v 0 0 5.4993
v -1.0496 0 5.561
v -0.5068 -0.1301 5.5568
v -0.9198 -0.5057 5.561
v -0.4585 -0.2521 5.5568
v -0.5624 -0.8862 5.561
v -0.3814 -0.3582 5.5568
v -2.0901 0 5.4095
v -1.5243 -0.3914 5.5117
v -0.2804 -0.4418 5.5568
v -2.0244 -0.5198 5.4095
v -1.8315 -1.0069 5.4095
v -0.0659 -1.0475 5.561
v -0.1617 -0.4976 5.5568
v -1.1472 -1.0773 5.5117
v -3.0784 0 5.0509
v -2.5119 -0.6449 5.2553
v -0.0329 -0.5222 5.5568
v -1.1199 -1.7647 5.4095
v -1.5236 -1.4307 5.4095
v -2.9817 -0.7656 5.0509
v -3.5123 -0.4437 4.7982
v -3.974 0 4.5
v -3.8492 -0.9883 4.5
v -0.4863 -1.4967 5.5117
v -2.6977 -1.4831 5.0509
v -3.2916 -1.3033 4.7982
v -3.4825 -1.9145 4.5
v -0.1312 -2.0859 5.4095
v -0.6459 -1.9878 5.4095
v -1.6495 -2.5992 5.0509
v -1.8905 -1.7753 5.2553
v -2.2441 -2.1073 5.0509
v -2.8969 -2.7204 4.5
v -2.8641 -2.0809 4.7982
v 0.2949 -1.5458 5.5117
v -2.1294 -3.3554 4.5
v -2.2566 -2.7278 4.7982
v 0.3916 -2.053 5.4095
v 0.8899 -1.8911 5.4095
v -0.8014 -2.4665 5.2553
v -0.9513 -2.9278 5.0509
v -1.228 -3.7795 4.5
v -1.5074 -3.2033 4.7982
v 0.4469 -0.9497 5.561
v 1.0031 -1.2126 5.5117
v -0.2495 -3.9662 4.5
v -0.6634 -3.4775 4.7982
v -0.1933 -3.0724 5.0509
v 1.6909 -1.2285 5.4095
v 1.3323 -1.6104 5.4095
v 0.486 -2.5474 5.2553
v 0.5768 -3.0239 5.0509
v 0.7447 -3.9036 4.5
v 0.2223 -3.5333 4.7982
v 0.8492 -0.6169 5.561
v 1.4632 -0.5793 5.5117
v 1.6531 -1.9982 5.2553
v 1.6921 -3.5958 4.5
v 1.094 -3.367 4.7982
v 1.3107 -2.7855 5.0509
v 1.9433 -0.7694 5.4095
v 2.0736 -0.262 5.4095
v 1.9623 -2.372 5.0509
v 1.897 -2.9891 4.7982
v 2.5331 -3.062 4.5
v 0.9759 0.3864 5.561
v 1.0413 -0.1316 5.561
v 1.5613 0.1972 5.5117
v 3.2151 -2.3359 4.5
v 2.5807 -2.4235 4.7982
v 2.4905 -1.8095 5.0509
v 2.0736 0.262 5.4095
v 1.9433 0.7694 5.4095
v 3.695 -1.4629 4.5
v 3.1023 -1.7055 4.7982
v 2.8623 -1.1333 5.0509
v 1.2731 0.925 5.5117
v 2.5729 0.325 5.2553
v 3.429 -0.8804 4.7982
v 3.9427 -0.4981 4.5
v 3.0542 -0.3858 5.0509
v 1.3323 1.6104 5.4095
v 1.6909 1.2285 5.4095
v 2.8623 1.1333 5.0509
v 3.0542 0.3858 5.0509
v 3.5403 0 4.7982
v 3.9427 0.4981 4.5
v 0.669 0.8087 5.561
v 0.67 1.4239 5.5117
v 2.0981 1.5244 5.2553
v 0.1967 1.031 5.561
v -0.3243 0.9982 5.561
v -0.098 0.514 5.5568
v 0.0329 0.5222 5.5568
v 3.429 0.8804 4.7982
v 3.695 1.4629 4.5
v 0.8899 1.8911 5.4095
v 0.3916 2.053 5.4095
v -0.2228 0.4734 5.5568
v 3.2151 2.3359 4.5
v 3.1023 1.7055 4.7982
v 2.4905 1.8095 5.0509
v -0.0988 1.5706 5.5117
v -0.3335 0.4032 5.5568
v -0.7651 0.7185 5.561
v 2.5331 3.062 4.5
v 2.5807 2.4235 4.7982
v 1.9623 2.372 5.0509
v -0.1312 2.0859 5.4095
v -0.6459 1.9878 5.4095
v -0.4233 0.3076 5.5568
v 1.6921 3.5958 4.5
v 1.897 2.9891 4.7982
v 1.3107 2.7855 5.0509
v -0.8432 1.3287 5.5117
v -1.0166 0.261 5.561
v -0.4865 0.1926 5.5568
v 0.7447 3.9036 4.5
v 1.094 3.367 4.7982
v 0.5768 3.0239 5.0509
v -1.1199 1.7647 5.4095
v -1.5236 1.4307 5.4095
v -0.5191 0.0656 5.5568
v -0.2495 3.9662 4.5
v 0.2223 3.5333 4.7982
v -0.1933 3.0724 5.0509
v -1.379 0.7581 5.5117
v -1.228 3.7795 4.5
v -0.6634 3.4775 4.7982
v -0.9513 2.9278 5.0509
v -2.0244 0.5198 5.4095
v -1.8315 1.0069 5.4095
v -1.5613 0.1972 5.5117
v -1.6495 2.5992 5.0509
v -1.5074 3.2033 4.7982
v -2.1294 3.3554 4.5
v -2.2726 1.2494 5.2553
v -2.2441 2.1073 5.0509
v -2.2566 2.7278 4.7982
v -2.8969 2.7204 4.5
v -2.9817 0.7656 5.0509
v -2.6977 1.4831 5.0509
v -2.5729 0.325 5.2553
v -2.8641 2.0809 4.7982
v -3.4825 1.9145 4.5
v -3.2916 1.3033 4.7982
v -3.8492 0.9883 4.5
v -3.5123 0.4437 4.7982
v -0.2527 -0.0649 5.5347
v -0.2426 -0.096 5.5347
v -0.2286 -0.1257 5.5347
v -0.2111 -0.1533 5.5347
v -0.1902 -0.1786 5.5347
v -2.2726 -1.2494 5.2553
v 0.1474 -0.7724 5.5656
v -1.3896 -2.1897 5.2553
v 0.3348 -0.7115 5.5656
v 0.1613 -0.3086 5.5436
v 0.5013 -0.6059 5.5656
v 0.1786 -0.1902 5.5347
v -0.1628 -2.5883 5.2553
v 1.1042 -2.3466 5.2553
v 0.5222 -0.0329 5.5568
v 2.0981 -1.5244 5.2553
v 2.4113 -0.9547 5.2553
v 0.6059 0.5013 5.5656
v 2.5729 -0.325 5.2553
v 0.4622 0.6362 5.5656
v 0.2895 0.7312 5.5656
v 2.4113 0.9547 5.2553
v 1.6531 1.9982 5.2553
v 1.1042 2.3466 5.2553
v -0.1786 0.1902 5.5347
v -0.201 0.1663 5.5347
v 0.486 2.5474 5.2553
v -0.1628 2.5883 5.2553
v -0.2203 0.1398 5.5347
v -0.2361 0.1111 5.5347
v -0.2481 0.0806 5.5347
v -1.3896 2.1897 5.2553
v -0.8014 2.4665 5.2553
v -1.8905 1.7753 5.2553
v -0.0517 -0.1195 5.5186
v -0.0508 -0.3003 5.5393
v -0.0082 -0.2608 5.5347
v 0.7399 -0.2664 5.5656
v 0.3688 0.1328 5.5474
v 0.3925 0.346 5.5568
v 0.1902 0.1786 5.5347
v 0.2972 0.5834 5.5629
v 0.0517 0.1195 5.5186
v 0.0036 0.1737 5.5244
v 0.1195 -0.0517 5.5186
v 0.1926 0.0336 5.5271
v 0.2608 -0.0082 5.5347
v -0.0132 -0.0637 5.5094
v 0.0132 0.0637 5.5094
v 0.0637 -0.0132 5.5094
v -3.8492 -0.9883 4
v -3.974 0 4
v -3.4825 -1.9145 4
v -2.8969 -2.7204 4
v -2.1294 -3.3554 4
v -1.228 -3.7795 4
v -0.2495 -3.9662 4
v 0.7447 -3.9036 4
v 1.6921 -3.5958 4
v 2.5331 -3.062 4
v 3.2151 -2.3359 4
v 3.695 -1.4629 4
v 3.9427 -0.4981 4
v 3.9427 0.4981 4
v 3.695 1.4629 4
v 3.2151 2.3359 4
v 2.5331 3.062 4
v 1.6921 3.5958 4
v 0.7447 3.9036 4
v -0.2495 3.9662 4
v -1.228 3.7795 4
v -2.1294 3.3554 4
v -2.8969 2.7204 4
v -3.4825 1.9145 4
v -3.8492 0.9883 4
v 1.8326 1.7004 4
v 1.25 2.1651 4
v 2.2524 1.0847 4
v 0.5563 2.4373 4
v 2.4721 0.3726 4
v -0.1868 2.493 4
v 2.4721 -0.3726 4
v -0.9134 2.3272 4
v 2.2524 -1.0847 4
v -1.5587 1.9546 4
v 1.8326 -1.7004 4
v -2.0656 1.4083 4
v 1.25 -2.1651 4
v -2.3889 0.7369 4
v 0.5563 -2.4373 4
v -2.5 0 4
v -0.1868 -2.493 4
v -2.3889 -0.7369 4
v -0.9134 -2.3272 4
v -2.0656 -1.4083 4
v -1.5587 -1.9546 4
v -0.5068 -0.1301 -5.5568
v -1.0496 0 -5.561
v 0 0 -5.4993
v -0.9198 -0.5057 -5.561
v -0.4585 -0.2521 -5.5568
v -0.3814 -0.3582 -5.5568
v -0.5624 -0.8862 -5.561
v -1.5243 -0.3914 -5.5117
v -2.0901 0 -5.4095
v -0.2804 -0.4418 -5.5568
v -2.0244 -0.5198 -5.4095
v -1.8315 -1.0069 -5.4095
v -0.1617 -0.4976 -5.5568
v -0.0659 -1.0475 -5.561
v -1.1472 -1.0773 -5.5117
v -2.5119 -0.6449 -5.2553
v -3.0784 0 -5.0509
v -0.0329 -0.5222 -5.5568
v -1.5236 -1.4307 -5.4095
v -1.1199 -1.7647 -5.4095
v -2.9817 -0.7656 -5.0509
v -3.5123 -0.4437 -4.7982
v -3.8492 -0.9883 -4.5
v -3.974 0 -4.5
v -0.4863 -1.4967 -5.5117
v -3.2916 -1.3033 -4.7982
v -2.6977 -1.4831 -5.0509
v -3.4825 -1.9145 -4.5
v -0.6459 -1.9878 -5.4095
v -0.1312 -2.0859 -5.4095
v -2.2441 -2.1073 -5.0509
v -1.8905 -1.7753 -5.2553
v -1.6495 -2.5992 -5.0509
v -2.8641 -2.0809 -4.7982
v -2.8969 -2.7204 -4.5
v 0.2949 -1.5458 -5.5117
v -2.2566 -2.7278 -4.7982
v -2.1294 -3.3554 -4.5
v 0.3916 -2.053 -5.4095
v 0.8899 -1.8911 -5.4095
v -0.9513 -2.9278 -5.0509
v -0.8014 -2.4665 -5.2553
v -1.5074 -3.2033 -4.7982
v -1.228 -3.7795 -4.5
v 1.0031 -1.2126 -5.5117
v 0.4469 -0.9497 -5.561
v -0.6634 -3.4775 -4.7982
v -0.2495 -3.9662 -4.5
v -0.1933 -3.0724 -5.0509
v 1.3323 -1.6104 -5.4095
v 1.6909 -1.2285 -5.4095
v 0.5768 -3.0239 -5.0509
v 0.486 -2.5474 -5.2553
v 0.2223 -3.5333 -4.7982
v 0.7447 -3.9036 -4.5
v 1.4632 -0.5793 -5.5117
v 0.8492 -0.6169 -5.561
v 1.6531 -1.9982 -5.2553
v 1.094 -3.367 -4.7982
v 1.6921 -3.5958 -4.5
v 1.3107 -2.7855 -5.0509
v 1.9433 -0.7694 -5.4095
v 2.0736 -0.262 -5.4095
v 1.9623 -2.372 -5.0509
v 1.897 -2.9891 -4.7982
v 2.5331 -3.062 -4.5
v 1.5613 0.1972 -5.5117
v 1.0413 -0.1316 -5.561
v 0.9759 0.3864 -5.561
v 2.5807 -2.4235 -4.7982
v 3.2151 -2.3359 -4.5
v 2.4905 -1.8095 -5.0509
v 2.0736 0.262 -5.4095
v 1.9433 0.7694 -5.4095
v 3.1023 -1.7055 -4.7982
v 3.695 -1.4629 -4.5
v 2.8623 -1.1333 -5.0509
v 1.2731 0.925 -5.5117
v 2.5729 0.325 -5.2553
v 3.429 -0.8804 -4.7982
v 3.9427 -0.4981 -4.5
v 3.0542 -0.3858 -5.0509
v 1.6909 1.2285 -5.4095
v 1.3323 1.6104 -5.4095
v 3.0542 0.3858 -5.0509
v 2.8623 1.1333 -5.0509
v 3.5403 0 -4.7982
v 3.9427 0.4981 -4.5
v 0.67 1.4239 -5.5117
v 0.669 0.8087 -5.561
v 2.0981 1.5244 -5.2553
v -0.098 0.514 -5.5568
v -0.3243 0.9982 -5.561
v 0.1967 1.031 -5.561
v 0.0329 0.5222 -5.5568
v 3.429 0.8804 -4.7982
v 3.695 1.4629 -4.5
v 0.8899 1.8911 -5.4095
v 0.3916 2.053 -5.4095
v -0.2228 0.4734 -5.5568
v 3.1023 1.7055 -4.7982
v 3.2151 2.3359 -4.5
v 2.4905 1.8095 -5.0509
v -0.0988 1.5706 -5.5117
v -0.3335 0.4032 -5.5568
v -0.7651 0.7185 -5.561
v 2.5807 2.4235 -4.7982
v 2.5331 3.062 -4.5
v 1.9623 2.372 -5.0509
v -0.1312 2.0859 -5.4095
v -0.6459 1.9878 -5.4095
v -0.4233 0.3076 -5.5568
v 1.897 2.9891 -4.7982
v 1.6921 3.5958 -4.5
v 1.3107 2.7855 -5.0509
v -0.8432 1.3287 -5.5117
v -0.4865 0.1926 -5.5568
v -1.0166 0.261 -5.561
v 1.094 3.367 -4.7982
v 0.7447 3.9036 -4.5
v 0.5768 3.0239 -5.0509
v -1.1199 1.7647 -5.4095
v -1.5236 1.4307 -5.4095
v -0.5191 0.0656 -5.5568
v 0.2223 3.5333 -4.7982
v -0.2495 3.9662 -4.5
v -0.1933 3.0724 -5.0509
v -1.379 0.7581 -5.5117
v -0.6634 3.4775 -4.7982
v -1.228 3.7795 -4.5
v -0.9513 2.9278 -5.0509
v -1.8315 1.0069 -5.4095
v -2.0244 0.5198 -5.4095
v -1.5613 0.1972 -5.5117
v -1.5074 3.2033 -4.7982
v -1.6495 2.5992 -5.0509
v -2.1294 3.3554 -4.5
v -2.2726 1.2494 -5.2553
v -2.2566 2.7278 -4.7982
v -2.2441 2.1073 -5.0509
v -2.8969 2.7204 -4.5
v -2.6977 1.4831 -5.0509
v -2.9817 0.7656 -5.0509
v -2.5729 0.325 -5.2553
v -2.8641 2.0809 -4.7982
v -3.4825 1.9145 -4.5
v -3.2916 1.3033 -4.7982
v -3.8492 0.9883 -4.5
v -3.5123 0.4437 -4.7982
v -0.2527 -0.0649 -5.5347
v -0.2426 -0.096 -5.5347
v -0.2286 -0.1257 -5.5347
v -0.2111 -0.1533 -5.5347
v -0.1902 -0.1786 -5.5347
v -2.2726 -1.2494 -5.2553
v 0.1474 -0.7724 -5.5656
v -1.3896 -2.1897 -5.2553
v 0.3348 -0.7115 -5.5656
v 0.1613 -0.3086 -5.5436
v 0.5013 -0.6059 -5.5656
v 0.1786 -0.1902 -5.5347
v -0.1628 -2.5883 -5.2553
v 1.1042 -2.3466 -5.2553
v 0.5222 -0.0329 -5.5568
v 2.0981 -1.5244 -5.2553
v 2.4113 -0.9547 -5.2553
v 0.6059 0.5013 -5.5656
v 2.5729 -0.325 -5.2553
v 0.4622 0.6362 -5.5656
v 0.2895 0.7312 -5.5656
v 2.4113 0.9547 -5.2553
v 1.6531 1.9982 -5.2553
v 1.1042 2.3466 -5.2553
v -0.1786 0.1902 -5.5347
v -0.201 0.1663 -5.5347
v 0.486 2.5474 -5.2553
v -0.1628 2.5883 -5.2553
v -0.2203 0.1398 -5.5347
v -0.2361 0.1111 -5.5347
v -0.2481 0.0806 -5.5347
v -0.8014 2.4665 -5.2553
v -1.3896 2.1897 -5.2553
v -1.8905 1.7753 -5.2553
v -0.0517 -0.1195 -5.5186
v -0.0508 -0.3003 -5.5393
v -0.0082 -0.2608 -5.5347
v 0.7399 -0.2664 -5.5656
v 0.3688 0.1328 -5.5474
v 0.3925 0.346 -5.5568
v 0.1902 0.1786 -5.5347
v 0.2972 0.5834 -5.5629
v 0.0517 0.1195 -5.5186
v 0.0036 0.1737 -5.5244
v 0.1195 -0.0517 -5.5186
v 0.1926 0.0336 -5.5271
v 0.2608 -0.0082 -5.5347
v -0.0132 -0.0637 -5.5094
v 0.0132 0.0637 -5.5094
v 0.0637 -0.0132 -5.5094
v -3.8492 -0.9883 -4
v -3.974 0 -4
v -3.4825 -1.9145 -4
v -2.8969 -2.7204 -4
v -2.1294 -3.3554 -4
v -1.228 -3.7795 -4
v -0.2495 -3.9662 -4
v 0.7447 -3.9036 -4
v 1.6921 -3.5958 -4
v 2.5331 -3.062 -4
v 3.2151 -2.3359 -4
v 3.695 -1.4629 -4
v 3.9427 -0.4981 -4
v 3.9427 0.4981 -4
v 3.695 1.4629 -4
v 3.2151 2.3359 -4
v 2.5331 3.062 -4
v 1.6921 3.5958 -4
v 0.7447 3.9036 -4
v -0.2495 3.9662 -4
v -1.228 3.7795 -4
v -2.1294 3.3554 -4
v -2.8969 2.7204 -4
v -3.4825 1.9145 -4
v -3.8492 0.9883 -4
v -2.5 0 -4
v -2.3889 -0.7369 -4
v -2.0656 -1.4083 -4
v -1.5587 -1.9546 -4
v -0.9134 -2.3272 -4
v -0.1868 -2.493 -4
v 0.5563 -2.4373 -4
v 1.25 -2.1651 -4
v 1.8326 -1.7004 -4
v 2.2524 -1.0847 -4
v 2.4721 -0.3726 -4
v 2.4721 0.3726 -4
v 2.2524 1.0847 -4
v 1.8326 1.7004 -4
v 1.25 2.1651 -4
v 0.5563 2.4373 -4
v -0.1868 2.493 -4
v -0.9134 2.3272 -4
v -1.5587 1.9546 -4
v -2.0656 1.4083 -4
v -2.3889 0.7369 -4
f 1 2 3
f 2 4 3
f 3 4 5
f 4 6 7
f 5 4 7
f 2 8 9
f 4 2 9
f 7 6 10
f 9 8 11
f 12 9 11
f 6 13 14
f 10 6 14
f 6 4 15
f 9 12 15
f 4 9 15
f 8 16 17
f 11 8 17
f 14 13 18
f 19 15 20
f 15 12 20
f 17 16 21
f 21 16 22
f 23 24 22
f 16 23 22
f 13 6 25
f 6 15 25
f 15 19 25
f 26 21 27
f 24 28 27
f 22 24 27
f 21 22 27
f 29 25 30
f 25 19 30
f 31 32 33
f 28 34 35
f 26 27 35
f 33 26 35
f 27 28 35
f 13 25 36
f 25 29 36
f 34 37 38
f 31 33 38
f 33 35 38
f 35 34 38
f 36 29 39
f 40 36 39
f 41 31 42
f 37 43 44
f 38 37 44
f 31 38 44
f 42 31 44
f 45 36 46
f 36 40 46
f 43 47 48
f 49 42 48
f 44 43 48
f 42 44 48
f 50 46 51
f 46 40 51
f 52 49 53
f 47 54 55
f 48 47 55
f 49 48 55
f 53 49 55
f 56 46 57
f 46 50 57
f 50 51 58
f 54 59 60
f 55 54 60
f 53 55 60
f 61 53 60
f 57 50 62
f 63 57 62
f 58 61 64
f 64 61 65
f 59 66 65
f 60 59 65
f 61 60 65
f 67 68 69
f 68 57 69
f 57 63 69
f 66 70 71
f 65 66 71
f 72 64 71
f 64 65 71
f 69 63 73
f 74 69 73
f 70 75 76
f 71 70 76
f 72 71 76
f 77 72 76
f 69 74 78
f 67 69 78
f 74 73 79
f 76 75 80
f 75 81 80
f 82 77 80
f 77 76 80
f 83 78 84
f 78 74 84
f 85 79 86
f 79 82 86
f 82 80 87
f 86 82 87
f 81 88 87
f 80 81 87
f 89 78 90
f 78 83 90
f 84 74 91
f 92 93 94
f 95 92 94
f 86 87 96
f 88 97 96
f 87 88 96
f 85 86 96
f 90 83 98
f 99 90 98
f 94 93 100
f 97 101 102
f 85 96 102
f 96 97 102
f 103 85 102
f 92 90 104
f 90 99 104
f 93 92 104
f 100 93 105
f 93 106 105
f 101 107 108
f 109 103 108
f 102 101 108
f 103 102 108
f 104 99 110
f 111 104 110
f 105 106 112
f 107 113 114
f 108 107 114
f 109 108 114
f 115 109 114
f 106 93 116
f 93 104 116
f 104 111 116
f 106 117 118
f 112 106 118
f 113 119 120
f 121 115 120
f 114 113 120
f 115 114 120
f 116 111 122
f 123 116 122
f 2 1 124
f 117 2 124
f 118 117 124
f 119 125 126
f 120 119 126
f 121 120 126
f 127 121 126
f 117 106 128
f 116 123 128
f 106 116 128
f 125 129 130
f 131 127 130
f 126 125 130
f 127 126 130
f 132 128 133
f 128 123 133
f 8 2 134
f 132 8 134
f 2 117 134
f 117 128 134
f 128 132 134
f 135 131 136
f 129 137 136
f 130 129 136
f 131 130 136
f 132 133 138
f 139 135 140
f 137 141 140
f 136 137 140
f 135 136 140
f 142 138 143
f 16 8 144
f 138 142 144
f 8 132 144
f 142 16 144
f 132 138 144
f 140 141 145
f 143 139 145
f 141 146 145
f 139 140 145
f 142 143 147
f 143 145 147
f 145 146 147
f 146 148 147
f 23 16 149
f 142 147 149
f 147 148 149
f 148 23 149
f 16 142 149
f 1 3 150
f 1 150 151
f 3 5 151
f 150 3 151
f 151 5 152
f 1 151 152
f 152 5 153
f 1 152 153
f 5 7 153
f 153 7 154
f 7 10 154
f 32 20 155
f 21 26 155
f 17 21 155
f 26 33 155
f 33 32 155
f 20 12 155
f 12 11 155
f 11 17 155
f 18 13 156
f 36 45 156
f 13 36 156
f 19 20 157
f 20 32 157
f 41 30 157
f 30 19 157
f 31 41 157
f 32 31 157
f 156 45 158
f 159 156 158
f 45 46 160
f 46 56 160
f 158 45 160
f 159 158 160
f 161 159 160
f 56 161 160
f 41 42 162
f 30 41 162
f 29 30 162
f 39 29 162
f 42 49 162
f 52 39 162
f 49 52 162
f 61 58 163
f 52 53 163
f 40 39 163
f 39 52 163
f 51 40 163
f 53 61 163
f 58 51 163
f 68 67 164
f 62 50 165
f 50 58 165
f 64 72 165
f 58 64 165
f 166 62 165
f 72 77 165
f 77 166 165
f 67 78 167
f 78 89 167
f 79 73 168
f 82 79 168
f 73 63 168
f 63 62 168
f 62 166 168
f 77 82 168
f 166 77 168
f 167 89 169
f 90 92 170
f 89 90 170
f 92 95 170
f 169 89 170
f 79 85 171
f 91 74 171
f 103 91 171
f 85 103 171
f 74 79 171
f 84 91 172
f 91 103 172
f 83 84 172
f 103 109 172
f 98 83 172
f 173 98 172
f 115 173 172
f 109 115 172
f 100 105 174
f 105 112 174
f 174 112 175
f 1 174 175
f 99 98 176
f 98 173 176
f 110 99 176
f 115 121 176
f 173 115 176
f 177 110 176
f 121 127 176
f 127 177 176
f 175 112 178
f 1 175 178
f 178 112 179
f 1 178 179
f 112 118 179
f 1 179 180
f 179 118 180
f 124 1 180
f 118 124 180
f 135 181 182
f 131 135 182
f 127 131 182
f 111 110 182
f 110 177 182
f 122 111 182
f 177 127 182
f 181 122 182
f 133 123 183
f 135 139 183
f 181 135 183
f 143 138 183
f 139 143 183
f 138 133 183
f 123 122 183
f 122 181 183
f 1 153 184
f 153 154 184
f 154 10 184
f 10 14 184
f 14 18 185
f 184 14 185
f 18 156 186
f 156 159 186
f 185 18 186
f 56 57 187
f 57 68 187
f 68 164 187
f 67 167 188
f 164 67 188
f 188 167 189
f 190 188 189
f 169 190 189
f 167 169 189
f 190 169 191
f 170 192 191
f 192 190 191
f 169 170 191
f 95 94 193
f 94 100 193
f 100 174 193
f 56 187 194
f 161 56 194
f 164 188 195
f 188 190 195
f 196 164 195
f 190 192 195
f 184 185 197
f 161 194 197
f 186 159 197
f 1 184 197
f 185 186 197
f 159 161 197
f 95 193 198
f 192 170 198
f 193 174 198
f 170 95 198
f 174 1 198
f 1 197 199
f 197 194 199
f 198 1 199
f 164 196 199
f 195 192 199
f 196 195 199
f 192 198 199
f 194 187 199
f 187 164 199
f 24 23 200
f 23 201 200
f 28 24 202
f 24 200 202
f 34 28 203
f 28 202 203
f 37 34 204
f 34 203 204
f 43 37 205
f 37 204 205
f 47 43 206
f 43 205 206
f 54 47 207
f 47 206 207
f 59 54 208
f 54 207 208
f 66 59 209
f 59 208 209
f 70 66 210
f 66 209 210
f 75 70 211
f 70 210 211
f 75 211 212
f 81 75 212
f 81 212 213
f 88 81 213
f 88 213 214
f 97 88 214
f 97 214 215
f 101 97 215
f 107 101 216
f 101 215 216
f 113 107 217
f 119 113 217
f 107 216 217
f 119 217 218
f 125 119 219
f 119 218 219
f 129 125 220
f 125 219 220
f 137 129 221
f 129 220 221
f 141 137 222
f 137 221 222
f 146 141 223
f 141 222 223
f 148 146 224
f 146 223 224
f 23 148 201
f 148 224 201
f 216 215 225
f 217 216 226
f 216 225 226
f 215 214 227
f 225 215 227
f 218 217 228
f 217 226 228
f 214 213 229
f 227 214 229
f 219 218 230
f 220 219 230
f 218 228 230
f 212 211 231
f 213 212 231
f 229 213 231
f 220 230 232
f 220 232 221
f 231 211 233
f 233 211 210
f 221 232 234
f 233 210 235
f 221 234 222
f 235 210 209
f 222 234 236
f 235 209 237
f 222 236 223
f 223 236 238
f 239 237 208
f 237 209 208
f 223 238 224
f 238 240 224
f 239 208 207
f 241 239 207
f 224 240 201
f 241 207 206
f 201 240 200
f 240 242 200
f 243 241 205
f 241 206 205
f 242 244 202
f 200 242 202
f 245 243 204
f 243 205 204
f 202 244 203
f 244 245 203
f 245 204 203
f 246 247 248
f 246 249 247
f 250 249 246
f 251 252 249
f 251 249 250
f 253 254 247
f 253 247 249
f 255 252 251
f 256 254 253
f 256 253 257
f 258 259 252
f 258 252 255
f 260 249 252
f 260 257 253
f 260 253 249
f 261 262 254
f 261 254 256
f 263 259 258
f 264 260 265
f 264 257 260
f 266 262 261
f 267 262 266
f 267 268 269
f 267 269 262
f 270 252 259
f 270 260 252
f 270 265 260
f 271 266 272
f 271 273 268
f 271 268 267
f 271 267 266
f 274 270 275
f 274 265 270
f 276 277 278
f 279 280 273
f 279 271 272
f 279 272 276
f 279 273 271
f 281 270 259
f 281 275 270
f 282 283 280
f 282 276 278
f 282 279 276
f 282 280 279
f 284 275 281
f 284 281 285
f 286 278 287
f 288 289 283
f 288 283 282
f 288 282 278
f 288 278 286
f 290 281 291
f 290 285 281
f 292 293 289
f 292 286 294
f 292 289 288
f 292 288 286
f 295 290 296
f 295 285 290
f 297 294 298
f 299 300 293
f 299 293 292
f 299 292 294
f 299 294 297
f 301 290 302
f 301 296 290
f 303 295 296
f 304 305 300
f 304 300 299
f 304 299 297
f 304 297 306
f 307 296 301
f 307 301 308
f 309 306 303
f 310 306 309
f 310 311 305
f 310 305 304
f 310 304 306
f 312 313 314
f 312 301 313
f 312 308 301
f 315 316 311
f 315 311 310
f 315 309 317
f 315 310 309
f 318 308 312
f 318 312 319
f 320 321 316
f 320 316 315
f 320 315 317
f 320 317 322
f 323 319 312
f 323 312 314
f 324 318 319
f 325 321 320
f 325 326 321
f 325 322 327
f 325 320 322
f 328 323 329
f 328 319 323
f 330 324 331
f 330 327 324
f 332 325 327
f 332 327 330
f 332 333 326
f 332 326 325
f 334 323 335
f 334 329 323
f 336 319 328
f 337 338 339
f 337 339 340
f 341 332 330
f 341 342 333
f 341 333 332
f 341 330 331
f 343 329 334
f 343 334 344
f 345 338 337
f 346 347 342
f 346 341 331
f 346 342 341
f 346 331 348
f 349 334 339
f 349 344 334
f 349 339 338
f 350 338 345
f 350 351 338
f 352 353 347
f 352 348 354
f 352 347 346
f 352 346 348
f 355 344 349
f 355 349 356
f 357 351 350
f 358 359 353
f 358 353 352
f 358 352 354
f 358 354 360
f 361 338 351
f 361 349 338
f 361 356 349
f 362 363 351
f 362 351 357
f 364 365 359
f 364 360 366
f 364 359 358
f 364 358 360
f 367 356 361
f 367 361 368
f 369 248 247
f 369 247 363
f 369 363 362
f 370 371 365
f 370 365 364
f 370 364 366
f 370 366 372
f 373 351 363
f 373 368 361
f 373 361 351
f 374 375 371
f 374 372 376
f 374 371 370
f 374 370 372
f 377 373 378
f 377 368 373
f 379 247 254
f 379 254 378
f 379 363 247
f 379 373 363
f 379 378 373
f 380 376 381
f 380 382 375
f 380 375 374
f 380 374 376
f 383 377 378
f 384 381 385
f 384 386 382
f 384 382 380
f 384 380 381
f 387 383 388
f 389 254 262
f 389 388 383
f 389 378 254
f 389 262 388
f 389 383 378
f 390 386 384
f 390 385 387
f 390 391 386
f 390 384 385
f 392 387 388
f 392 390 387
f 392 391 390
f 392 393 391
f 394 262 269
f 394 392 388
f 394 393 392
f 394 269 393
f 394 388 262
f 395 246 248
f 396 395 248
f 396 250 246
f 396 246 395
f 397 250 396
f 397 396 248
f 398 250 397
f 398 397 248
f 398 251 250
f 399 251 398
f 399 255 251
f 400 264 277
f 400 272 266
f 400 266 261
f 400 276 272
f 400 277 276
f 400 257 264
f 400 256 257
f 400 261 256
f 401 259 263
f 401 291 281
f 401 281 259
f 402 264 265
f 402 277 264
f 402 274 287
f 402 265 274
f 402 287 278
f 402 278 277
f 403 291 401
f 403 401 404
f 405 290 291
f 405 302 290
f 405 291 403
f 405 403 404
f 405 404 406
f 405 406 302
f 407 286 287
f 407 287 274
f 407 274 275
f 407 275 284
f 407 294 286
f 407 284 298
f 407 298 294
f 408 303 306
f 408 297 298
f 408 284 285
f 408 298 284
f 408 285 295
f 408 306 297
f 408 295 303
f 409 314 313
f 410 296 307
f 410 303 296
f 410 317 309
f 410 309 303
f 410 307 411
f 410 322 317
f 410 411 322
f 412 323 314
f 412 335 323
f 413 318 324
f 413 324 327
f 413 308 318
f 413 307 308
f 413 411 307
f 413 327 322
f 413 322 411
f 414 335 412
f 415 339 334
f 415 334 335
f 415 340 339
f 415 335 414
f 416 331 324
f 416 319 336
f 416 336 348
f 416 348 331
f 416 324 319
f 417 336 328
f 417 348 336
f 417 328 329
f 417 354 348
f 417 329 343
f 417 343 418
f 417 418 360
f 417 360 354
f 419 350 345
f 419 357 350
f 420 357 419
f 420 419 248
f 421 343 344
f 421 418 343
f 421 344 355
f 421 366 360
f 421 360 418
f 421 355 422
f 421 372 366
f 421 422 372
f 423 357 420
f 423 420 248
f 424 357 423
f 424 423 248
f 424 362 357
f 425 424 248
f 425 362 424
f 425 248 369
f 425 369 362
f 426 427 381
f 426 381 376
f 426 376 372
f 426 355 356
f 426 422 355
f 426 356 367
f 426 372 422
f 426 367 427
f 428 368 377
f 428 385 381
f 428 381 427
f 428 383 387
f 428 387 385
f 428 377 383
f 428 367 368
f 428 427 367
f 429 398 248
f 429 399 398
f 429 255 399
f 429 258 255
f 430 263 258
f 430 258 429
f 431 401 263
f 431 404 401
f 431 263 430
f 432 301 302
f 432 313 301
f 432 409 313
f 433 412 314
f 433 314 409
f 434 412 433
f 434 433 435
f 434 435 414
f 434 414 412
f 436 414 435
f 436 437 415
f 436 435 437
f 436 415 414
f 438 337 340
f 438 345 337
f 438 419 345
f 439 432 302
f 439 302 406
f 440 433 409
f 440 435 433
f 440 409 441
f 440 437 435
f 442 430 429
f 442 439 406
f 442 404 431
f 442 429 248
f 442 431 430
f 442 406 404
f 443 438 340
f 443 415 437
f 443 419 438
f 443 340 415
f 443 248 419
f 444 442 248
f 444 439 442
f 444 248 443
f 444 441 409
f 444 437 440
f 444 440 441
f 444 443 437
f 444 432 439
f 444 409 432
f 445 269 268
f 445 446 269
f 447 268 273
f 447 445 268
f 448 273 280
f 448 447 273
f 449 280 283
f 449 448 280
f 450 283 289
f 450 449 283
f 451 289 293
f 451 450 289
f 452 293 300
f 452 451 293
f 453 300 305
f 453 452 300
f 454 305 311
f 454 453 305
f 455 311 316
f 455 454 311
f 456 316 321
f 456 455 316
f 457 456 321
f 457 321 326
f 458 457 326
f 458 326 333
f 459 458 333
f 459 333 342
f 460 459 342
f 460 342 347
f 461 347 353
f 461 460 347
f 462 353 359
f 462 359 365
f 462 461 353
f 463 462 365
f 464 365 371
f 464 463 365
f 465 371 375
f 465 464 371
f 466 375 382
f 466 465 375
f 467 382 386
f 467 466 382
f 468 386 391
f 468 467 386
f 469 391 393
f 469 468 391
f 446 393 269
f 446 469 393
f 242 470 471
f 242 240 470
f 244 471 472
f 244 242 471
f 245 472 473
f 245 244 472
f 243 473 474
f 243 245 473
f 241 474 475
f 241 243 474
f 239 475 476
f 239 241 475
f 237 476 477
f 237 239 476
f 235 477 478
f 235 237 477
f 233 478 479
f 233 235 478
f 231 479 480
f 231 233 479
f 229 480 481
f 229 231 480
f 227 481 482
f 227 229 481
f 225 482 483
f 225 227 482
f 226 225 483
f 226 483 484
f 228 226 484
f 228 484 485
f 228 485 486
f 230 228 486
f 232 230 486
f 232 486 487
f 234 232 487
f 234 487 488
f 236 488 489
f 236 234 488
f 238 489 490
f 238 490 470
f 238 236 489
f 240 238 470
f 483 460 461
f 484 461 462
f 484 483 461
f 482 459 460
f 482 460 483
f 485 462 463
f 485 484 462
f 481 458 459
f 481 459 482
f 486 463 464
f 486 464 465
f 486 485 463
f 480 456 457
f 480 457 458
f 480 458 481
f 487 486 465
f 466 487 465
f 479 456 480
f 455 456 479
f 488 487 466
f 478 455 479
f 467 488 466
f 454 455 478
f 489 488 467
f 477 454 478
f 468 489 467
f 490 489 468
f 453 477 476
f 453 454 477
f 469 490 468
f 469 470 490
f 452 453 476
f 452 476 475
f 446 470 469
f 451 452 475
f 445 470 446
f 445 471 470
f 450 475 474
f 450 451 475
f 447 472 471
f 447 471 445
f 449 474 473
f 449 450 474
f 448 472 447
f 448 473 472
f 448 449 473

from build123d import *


with BuildPart() as f1:
    # F0 (on Front) → F1 (revolve)
    with BuildSketch(Plane.XZ):
        with BuildLine():
            Line((-2.5, 0), (0, 0))
            Line((0, 0), (0, 5.499265))
            ThreePointArc((0, 5.499265), (-2.090062, 5.409453), (-3.974026, 4.5))
            Line((-3.974026, 4.5), (-3.974026, 4))
            Line((-3.974026, 4), (-2.5, 4))
            Line((-2.5, 4), (-2.5, 0))
        make_face()
    revolve(axis=Axis((0, 0, 2.749633), (0, 0, 1)))

    # F2: F1 across face


with BuildPart() as f1_1:
    add(f1.part)
    add(f1.part.mirror(Plane(origin=(0, 0, 0), x_dir=(1, 0, 0), z_dir=(0, 0, -1))))


solid = f1_1.part
